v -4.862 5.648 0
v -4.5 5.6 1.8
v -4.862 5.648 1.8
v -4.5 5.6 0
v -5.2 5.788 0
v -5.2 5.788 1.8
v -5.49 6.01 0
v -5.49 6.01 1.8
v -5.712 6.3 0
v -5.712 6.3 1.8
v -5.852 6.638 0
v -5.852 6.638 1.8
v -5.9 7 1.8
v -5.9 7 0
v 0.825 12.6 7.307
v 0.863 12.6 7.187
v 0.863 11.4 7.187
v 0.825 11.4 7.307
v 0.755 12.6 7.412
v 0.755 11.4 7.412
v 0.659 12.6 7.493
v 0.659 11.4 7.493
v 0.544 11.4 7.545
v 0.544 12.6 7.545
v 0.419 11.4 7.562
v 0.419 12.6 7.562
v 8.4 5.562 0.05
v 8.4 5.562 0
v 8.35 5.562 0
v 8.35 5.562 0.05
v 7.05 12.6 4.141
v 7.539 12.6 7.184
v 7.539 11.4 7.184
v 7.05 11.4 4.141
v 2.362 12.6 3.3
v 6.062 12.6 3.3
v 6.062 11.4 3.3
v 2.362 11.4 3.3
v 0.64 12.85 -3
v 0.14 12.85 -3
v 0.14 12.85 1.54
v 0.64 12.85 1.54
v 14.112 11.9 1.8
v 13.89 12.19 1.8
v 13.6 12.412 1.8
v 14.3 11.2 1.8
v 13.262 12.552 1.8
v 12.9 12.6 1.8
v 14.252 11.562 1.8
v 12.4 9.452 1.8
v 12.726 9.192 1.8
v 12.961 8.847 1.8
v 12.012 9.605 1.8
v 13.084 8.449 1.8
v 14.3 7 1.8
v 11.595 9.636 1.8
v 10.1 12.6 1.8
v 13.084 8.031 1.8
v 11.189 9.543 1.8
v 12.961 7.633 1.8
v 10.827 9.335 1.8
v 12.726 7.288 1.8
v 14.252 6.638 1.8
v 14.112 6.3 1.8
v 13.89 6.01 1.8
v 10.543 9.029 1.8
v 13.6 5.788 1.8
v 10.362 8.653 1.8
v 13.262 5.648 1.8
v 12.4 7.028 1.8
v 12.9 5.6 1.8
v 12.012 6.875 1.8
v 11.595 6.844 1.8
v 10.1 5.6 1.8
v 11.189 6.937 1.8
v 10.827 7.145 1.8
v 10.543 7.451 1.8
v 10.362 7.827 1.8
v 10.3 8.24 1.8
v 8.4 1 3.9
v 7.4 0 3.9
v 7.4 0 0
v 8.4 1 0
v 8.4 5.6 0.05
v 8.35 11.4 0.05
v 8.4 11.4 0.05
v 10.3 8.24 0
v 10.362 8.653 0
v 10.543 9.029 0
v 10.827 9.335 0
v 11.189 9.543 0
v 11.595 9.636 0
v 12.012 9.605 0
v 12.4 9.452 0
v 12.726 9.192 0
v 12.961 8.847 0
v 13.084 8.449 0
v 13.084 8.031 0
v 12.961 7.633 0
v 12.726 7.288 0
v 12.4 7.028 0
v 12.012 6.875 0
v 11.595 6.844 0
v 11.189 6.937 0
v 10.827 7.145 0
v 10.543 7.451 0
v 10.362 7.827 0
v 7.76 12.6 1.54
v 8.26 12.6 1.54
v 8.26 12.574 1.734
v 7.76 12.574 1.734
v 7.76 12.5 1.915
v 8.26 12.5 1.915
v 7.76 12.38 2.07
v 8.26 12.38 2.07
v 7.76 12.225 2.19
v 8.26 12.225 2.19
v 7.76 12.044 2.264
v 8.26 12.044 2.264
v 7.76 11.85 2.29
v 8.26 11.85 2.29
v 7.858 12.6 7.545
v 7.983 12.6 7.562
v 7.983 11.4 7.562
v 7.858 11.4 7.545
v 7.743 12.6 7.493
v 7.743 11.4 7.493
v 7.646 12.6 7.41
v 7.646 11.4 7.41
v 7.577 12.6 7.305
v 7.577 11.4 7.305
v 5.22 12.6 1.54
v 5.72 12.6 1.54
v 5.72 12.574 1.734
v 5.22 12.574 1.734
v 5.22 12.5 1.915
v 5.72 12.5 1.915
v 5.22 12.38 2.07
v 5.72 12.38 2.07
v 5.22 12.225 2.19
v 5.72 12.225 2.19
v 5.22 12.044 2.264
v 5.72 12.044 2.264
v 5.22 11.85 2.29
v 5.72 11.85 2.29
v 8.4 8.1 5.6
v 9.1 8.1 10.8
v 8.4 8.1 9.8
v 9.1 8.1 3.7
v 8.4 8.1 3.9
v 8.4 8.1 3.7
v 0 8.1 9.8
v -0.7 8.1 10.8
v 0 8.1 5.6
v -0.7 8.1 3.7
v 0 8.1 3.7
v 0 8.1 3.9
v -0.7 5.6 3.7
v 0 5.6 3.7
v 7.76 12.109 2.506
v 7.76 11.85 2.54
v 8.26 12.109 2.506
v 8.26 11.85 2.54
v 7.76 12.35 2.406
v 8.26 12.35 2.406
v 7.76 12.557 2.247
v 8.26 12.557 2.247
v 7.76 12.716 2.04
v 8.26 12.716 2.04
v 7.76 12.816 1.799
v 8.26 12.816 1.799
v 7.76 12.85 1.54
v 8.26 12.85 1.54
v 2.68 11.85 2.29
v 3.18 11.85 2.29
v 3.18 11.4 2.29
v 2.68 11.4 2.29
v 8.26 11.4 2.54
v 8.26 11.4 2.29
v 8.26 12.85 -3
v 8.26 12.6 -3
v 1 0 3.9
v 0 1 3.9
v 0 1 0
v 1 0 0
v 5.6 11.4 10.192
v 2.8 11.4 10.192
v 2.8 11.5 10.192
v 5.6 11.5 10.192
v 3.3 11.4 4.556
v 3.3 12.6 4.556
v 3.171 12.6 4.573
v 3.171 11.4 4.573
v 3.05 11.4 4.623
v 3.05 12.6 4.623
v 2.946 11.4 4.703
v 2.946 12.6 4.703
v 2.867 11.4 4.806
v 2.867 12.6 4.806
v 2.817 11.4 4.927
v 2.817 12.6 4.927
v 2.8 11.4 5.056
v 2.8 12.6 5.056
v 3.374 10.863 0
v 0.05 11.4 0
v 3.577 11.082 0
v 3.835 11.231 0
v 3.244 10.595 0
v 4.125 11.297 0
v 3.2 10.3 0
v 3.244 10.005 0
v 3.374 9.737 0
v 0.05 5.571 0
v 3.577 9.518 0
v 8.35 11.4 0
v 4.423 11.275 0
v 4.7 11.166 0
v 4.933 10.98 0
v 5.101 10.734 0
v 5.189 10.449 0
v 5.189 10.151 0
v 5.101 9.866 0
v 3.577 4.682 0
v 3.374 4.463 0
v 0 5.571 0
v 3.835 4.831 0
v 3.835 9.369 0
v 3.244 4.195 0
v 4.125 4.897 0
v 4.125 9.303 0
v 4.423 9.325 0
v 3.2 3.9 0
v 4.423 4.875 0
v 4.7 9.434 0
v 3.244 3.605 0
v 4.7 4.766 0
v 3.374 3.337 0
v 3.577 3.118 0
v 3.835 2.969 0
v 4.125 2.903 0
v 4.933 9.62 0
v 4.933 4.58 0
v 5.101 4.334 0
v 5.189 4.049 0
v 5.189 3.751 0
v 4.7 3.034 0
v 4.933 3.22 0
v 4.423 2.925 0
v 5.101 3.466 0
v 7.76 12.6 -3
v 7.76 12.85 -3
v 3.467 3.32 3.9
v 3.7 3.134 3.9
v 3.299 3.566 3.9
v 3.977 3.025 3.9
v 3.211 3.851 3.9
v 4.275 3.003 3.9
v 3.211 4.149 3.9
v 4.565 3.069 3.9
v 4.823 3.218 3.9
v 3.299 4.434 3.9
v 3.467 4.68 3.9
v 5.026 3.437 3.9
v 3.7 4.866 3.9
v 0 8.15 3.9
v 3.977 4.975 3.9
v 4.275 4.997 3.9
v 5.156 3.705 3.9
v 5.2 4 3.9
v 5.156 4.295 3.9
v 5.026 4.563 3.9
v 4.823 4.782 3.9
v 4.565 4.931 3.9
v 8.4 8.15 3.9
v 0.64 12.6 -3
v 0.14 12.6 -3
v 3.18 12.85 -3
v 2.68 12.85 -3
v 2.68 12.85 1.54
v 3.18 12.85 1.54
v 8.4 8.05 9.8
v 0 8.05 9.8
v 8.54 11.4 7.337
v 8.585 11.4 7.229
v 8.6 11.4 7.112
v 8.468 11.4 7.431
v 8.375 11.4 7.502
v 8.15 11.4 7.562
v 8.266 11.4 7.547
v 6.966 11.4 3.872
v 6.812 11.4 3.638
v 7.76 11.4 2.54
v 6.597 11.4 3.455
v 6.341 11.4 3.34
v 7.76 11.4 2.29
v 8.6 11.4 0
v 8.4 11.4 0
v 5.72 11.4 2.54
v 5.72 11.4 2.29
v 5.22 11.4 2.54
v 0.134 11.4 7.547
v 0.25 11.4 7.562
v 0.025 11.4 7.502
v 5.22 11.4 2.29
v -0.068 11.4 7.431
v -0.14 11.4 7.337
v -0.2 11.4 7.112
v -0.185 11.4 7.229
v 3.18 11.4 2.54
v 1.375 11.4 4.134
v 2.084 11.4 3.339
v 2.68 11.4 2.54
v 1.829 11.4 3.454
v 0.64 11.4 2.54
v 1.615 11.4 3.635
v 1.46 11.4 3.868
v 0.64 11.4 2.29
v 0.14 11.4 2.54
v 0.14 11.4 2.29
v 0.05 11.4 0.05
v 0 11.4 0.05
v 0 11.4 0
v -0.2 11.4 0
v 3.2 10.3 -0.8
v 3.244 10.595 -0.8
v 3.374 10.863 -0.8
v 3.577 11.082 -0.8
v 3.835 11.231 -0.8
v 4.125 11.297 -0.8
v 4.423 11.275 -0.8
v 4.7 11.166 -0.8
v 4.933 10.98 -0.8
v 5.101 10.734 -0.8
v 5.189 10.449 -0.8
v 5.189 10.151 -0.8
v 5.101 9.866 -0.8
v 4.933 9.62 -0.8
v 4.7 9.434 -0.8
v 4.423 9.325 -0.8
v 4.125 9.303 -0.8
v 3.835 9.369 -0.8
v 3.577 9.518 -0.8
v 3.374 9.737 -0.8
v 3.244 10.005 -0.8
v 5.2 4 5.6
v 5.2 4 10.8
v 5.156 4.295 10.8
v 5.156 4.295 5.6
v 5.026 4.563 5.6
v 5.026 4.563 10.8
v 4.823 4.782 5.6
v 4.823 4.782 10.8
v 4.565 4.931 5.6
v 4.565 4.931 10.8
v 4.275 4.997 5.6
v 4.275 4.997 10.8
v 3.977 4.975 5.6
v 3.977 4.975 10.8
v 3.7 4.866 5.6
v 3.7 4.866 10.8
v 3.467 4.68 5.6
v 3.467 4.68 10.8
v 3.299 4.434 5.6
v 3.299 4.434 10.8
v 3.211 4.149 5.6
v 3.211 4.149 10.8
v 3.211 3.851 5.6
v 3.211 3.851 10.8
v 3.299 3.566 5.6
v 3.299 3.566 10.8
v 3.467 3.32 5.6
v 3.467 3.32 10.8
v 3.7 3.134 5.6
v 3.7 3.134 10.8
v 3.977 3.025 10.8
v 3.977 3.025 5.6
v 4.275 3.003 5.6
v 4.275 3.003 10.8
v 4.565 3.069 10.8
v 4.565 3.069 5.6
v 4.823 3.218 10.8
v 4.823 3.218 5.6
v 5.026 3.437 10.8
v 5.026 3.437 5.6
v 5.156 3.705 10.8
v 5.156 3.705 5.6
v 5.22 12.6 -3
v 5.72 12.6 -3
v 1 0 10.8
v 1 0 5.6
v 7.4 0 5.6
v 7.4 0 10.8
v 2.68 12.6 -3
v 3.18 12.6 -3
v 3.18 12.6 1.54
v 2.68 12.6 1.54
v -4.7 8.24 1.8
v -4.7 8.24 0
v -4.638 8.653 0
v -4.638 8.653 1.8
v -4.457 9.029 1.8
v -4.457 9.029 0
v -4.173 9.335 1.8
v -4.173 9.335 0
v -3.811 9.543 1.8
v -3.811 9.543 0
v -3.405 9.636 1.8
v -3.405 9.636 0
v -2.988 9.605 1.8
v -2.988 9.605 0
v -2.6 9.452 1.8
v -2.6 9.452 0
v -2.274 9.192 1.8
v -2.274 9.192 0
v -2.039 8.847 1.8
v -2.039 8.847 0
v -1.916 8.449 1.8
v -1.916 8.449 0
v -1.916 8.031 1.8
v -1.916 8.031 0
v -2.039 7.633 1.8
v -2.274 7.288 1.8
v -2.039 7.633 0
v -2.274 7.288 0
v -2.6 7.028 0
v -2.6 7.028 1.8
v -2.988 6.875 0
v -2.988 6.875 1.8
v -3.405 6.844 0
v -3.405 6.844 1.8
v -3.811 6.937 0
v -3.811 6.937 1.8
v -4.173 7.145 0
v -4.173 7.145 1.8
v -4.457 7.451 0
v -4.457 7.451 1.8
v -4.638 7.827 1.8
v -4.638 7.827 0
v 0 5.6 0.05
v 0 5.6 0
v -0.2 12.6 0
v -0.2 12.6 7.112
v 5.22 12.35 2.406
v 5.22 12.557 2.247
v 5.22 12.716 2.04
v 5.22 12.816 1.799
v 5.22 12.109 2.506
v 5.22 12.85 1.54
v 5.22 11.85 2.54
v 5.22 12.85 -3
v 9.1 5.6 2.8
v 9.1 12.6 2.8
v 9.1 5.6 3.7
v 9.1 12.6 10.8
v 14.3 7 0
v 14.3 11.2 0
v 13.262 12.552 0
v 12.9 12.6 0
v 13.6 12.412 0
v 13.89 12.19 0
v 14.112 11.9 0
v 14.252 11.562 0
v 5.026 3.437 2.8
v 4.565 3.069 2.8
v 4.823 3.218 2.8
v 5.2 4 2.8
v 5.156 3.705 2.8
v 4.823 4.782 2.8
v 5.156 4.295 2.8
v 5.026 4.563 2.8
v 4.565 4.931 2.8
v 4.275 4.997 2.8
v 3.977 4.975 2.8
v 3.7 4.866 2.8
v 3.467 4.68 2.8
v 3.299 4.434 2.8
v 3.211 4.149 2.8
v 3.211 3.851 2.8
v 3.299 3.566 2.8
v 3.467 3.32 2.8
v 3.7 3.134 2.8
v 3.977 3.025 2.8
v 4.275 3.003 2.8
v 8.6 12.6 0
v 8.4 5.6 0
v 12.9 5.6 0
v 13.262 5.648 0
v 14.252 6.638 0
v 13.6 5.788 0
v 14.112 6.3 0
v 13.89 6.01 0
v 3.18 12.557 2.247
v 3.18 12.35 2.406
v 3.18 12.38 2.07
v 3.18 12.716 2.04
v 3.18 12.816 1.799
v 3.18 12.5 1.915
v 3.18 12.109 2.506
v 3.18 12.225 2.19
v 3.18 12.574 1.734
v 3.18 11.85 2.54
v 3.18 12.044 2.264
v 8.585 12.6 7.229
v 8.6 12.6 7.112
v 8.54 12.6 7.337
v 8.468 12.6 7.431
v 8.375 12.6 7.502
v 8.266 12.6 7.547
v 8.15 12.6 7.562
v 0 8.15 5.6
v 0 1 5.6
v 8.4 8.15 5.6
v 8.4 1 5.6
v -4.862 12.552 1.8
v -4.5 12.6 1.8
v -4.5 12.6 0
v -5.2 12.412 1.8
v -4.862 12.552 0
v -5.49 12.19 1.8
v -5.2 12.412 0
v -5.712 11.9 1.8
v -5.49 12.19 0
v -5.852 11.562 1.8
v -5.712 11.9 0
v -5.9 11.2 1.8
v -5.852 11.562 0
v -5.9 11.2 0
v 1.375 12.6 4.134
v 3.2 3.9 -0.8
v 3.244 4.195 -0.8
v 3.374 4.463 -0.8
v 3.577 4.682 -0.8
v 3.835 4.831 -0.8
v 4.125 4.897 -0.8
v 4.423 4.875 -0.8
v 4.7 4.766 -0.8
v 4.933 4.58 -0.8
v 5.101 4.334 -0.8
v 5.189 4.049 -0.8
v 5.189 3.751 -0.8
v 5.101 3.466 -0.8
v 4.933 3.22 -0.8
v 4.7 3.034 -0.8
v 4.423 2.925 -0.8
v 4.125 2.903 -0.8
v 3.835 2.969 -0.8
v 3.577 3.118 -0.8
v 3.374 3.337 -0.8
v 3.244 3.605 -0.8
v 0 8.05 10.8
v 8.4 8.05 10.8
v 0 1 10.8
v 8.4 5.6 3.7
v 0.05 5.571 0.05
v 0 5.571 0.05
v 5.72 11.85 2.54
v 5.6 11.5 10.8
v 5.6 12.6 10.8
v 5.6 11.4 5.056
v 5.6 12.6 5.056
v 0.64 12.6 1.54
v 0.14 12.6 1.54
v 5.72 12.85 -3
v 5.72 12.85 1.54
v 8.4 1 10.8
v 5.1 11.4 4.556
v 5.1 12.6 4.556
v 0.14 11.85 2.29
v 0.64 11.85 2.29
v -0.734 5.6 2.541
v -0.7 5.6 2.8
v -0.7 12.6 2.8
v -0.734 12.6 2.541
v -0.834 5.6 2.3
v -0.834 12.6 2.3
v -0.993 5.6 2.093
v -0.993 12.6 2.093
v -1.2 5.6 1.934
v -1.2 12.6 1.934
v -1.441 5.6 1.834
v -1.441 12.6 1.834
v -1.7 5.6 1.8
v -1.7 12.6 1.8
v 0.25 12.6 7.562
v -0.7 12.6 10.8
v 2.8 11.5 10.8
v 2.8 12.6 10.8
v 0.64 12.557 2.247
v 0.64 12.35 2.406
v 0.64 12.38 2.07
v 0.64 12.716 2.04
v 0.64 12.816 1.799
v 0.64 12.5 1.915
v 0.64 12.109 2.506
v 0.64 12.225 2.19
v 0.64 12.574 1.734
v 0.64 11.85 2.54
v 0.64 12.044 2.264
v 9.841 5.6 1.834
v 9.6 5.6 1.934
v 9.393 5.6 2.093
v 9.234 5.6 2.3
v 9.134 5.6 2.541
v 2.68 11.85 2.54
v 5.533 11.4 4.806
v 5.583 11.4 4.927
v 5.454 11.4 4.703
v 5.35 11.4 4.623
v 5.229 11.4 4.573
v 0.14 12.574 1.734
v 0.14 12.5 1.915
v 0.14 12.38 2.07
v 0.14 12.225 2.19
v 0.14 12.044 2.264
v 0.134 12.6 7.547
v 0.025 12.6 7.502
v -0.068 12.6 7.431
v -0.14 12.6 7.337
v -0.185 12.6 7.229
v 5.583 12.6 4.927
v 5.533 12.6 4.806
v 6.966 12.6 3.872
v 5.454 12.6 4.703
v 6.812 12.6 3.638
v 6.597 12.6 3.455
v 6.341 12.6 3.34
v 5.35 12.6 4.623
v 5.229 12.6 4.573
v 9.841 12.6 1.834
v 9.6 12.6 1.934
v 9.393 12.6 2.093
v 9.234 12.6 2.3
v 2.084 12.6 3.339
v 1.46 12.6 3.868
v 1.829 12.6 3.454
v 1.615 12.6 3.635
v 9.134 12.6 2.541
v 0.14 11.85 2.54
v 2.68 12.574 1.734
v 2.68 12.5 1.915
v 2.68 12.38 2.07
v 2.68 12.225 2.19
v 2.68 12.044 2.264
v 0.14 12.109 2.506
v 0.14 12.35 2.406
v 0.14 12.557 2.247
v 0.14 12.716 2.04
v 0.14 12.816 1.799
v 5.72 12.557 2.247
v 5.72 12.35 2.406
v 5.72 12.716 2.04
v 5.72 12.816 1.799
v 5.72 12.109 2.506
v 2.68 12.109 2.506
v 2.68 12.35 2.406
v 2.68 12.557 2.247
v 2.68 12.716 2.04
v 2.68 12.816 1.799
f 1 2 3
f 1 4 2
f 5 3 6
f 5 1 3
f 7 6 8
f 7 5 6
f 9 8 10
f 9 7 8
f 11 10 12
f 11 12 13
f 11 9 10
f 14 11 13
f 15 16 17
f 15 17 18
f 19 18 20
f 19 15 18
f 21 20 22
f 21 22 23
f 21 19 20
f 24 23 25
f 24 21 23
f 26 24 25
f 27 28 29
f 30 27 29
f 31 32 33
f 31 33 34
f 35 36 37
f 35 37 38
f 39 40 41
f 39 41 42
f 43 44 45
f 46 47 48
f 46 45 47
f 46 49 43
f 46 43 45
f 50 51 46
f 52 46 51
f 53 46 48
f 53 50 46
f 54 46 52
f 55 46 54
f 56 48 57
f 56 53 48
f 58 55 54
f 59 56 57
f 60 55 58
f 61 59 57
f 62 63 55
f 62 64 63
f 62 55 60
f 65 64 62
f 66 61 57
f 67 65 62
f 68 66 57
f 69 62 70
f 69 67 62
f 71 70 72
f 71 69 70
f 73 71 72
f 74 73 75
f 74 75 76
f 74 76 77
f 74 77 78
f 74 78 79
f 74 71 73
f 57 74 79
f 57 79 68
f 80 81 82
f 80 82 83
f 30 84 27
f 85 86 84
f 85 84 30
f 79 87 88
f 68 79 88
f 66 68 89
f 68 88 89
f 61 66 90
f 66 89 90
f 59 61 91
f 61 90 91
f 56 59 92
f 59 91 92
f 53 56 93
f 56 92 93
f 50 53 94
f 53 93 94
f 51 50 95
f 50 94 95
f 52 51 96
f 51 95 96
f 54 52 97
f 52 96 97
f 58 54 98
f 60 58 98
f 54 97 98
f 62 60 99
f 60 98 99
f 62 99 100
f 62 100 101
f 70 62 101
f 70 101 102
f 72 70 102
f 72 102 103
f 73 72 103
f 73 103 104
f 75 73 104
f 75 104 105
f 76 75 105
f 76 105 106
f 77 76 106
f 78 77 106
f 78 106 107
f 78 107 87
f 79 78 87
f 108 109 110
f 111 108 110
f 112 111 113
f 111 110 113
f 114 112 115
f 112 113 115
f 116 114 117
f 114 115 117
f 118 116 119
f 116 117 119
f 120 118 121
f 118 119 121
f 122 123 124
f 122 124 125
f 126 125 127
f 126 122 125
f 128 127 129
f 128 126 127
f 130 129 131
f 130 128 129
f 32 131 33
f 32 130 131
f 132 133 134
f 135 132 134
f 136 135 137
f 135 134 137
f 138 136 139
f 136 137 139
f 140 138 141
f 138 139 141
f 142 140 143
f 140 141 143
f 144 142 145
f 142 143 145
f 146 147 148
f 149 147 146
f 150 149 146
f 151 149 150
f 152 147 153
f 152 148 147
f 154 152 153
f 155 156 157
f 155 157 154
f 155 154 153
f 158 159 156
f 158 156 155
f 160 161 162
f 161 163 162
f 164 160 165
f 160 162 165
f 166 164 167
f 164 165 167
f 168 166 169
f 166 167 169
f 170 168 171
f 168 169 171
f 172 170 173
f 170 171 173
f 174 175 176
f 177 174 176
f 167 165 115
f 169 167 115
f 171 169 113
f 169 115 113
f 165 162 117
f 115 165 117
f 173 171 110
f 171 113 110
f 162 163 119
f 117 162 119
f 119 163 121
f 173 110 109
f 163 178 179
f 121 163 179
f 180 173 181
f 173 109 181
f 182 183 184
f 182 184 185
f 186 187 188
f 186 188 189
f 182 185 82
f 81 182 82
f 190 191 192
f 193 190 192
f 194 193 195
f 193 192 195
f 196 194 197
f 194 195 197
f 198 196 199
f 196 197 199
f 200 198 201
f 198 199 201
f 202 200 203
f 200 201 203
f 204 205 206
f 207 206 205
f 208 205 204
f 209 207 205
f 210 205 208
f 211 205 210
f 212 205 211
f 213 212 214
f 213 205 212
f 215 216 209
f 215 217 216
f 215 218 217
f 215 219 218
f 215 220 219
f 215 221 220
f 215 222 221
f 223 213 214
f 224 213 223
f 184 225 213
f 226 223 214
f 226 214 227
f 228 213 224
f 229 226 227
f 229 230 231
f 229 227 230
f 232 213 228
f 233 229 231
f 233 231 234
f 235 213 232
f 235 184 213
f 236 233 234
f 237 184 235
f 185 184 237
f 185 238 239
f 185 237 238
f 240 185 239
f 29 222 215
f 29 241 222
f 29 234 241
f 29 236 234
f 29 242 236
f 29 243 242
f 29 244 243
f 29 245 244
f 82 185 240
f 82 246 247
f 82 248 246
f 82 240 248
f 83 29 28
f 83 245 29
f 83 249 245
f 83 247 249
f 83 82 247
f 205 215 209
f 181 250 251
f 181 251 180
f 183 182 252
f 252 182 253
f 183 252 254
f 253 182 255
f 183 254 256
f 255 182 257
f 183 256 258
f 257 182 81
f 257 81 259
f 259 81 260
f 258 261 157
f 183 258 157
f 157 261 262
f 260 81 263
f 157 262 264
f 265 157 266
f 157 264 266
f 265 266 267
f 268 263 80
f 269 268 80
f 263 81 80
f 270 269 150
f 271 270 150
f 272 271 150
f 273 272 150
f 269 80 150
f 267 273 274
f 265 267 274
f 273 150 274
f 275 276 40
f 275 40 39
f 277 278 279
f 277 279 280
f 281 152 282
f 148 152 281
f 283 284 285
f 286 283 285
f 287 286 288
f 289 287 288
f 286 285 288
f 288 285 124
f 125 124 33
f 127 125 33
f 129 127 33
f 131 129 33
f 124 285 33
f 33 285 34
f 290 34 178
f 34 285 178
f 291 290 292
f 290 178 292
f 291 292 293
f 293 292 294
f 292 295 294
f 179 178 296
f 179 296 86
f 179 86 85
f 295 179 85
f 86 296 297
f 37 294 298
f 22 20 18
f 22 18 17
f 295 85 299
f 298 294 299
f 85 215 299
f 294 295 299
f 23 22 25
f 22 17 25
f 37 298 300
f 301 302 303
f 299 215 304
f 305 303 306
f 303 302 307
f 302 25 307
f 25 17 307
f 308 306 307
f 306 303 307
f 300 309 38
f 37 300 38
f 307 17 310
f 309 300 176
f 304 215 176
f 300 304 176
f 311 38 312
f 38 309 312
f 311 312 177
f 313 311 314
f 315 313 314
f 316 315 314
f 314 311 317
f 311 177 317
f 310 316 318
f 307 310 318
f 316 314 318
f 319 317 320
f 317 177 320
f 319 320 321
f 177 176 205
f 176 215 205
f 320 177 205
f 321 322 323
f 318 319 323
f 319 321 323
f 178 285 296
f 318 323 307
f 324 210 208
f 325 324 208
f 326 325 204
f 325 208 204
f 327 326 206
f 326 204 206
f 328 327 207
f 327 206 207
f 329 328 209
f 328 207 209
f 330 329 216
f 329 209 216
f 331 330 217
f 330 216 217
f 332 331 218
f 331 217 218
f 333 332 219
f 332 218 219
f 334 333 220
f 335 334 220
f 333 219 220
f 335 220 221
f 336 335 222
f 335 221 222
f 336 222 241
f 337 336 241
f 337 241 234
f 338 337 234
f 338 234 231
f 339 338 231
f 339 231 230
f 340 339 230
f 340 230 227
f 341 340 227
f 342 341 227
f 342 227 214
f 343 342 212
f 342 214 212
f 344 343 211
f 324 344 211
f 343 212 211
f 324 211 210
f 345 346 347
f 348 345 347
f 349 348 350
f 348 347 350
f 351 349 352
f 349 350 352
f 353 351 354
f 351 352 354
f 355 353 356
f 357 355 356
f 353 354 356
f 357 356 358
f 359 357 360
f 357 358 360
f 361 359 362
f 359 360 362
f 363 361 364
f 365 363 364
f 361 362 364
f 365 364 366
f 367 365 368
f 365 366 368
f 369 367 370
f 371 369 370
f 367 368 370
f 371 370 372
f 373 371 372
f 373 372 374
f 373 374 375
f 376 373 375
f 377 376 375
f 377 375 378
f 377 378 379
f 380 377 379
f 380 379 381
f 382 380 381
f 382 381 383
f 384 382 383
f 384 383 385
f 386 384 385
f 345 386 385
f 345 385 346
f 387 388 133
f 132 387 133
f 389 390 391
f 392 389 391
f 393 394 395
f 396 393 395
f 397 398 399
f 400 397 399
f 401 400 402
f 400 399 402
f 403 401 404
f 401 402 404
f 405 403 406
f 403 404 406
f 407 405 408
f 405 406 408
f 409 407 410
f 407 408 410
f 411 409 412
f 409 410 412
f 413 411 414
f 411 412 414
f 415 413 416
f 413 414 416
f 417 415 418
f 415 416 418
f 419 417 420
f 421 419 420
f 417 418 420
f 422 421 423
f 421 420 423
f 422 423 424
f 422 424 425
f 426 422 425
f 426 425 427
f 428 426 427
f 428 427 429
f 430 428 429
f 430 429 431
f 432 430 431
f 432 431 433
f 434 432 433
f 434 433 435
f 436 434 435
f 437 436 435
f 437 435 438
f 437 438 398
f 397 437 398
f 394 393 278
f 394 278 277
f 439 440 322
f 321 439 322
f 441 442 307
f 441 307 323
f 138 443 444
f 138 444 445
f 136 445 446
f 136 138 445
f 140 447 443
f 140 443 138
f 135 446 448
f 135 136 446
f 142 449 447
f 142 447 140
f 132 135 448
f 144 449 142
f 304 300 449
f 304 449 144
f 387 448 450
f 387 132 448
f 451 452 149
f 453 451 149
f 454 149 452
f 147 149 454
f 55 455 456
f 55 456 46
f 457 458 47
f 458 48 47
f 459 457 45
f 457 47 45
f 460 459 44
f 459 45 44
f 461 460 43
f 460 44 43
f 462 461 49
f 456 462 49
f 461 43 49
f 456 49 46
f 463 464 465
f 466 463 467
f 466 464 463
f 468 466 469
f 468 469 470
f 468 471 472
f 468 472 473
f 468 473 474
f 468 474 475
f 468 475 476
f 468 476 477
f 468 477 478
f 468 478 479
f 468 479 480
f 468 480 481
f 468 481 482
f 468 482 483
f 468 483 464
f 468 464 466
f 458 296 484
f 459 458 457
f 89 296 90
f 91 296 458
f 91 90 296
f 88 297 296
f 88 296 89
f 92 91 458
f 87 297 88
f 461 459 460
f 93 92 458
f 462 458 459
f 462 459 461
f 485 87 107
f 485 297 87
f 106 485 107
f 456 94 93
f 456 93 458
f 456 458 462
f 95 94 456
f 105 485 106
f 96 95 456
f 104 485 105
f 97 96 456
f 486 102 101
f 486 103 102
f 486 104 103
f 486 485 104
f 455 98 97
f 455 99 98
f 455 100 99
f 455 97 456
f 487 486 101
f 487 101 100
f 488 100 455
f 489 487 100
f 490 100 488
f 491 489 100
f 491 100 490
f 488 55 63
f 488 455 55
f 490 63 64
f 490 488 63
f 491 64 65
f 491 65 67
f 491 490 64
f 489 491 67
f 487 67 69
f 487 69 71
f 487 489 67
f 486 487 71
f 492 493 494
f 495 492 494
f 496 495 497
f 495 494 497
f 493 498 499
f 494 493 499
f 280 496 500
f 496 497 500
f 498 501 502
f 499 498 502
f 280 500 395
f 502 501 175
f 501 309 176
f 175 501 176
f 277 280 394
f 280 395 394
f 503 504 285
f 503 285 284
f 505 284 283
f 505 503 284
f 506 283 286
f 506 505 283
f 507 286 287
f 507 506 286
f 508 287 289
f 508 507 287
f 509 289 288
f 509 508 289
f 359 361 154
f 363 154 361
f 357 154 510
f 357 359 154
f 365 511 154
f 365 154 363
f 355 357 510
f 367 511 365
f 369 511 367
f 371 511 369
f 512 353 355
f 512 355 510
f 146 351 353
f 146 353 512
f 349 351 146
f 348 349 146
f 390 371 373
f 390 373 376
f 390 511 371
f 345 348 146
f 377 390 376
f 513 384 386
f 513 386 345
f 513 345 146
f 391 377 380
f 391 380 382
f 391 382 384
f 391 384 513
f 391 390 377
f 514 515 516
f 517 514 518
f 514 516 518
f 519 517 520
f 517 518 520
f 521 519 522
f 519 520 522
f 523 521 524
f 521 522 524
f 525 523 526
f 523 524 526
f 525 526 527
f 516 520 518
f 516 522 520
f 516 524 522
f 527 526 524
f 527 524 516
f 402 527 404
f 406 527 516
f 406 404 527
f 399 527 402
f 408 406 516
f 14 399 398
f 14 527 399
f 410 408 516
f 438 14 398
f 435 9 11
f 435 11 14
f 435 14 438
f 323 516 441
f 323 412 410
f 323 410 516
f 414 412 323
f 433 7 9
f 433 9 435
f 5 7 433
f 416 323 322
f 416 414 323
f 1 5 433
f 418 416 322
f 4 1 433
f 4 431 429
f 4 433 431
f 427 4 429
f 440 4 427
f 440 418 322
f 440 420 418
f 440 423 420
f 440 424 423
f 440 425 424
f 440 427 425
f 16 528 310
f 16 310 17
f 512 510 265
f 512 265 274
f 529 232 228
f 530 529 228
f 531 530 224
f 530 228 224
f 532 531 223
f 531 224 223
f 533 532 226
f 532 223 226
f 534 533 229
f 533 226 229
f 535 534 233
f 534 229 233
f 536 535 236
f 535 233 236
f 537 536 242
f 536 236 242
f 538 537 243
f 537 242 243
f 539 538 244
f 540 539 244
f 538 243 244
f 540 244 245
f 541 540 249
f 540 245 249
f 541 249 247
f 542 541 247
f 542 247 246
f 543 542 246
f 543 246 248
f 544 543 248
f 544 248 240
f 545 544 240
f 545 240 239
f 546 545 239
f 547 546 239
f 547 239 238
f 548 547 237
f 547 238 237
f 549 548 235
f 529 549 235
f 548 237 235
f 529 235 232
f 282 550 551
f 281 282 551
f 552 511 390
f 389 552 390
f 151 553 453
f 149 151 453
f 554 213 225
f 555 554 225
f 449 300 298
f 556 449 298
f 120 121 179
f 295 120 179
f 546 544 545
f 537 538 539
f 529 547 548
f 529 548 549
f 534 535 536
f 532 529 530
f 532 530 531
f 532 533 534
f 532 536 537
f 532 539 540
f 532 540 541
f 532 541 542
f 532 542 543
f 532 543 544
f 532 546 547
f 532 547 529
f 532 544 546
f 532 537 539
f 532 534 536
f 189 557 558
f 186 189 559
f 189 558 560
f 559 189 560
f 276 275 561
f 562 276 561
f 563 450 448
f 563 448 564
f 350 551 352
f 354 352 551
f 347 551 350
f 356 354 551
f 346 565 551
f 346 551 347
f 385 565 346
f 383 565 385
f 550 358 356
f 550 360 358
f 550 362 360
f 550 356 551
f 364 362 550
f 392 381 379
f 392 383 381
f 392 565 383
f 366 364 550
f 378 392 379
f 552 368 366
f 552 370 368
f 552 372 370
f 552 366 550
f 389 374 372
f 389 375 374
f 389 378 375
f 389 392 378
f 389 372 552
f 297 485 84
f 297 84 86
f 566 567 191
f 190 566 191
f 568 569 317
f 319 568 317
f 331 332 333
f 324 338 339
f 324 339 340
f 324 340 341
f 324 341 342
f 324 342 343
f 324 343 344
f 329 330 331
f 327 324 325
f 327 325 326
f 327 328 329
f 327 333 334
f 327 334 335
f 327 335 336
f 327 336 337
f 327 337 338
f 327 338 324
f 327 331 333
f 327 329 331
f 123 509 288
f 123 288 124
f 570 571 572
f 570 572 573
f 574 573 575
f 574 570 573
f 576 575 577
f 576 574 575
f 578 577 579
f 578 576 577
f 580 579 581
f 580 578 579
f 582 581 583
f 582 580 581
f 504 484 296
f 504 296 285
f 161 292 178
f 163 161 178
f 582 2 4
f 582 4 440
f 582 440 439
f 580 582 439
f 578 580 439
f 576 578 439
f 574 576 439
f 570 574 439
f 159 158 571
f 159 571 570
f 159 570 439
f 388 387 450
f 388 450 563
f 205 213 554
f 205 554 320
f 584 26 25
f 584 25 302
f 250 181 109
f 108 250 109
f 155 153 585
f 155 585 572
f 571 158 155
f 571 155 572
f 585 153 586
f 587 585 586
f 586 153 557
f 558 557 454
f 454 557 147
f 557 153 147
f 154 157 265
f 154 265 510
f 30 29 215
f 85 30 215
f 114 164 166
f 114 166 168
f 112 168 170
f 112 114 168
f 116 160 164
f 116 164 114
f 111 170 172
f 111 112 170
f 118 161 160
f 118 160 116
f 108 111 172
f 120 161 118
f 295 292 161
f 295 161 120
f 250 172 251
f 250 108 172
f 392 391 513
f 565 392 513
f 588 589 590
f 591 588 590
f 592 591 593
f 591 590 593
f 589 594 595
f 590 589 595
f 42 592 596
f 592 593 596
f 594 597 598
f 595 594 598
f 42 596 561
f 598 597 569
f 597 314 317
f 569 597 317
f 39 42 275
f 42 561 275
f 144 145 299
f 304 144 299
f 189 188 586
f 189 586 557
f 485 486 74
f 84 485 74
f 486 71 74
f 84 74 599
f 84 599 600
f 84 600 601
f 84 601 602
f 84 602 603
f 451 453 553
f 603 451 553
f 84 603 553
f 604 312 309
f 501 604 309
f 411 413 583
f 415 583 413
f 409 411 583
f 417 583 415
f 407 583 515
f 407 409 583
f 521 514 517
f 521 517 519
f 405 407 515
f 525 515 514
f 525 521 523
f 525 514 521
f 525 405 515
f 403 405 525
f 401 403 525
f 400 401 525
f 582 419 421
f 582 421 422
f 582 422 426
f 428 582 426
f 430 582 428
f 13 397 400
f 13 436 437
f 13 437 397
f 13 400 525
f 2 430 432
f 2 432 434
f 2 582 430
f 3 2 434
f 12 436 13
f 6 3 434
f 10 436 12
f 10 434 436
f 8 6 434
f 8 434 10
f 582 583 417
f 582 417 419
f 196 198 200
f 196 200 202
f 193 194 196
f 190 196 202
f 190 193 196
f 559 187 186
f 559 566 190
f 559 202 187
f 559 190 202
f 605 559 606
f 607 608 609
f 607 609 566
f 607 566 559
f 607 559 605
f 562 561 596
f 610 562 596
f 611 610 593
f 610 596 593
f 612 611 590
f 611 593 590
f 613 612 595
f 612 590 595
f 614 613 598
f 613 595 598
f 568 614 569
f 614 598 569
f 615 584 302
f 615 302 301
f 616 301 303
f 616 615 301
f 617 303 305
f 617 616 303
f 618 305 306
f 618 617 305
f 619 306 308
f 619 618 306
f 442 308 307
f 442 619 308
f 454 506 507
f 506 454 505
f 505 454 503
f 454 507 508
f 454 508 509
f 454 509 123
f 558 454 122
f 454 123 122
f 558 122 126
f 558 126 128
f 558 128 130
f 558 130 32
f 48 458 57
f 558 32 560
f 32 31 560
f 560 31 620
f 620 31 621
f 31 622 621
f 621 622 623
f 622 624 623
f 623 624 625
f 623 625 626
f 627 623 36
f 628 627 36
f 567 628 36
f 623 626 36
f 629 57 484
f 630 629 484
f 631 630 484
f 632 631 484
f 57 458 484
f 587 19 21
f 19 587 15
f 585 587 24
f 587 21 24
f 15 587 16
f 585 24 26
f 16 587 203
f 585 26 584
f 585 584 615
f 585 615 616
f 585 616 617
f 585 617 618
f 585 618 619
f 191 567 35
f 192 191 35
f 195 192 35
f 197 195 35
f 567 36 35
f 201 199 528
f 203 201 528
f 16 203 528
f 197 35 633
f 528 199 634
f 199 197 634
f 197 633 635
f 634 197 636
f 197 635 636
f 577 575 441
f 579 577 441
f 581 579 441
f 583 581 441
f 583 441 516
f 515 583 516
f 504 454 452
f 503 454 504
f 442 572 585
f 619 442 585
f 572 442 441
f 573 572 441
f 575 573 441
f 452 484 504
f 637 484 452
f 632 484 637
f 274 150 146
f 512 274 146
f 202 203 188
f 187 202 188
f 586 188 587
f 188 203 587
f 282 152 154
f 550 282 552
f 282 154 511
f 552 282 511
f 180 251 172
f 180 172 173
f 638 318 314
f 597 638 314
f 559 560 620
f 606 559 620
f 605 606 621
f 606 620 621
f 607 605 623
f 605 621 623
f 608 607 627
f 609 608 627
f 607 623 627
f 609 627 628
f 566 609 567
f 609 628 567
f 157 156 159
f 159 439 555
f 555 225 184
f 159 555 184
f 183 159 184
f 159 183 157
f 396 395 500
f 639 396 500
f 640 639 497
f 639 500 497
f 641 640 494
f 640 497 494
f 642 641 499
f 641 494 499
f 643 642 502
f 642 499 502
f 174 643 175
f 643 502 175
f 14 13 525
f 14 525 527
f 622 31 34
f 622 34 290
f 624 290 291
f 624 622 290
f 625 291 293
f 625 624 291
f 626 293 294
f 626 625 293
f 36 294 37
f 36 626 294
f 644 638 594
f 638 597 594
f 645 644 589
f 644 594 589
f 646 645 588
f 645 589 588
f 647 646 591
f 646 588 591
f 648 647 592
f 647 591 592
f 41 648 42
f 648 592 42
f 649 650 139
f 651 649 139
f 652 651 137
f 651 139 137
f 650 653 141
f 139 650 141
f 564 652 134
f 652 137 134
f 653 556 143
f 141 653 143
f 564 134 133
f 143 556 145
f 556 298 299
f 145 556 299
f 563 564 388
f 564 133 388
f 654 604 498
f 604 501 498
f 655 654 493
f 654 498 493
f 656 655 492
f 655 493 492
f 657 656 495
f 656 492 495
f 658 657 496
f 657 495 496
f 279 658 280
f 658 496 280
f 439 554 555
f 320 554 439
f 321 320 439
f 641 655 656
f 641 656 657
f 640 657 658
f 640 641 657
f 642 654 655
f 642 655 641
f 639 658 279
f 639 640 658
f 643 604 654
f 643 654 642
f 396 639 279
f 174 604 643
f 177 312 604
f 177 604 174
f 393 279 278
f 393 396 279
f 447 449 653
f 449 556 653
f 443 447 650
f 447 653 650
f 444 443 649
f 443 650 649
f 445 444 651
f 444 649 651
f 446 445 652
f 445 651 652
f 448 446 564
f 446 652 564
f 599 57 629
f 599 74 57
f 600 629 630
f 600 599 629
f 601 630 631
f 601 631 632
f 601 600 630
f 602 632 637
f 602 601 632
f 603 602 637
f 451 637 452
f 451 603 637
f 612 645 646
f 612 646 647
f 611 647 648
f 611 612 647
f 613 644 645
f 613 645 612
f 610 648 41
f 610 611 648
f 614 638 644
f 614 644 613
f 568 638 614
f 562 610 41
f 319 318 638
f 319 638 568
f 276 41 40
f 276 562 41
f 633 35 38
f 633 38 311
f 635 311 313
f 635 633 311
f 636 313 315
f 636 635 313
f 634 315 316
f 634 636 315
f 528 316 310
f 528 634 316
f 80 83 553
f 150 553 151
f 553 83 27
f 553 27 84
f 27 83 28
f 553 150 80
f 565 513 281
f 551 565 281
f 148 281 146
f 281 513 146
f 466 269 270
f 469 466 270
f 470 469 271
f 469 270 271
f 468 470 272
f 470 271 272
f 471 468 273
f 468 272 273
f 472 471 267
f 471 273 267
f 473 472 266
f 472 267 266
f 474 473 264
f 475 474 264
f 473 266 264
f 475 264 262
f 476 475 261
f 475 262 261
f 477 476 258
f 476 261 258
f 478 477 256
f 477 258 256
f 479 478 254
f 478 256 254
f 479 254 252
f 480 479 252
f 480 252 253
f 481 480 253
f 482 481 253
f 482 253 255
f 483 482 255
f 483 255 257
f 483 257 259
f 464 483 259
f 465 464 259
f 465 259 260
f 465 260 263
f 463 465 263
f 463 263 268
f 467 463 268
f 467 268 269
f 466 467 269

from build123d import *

# Parameters (mm, degrees)
EXTRUDE_1_DEPTH      = 10.8
SKETCH_2_R           = 1
EXTRUDE_2_DEPTH      = 0.8
SKETCH_3_W           = 1.7
SKETCH_3_H           = 8.1
CUT_EXTRUDE_1_DEPTH  = 17.8
EXTRUDE_START        = -4.5
EXTRUDE_3_DEPTH      = 4.5
SKETCH_5_W           = 8.4
SKETCH_5_H           = 0.05
CUT_EXTRUDE_2_DEPTH  = 1
SKETCH_6_R           = 1
CUT_EXTRUDE_3_DEPTH  = 8
CUT_EXTRUDE_4_DEPTH  = 1.2
SKETCH_8_W           = 2.8
SKETCH_8_H           = 0.608363533
EXTRUDE_4_DEPTH      = 0.1
EXTRUDE_START_2      = 2.5
EXTRUDE_5_DEPTH      = 2.5
SKETCH_10_W          = 8.4
SKETCH_10_H          = 1.7
CUT_EXTRUDE_5_DEPTH  = 0.05
FILLET_1_R           = 1.4
SKETCH_11_W          = 0.05
SKETCH_11_H          = 5.83834946
SKETCH_11_H_2        = 5.828769054
CUT_EXTRUDE_8_DEPTH  = 0.05
SKETCH_12_R          = 1.4
CUT_EXTRUDE_9_DEPTH  = 4
SKETCH_13_W          = 0.5
SKETCH_13_H          = 5.54
EXTRUDE_6_DEPTH      = 1.45
FILLET_2_R           = 1
CUT_EXTRUDE_START    = -8.12
CUT_EXTRUDE_10_DEPTH = 8.12


with BuildPart() as part:
    # Эскиз1 → Бобышка-Вытянуть1 (new body)
    with BuildSketch(Plane.XY):
        Polygon((7.4, 0), (8.4, 1), (8.4, 12.6), (0, 12.6), (0, 1), (1, 0), align=None)
    extrude(amount=EXTRUDE_1_DEPTH)

    # Эскиз2 → Бобышка-Вытянуть2 (add)
    with BuildSketch(Plane(origin=(0, 0, 0), x_dir=(-1, 0, 0), z_dir=(0, 0, -1))):
        with Locations((-4.2, 10.3)):
            Circle(SKETCH_2_R)
        with Locations((-4.2, 3.9)):
            Circle(SKETCH_2_R)
    extrude(amount=EXTRUDE_2_DEPTH)

    # Эскиз3 → Вырез-Вытянуть1 (cut)
    with BuildSketch(Plane(origin=(8.4, 0, 0), x_dir=(0, 0, -1), z_dir=(1, 0, 0))):
        with Locations((-4.75, 4.05)):
            Rectangle(SKETCH_3_W, SKETCH_3_H)
    extrude(amount=-CUT_EXTRUDE_1_DEPTH, mode=Mode.SUBTRACT)

    # Эскиз4 → Бобышка-Вытянуть3 (add)
    with BuildSketch(Plane(origin=(0, 12.6, 0), x_dir=(1, 0, 0), z_dir=(0, 1, 0)).offset(EXTRUDE_START)):
        with BuildLine():
            Line((9.1, -10.8), (-0.7, -10.8))
            Line((-0.7, -10.8), (-0.7, -2.8))
            ThreePointArc((-0.7, -2.8), (-0.992893219, -2.092893219), (-1.7, -1.8))
            Line((-1.7, -1.8), (-5.9, -1.8))
            Line((-5.9, -1.8), (-5.9, 0))
            Line((-5.9, 0), (14.3, 0))
            Line((14.3, 0), (14.3, -1.8))
            Line((14.3, -1.8), (10.1, -1.8))
            ThreePointArc((10.1, -1.8), (9.392893219, -2.092893219), (9.1, -2.8))
            Line((9.1, -2.8), (9.1, -10.8))
        make_face()
    extrude(amount=EXTRUDE_3_DEPTH)

    # Эскиз5 → Вырез-Вытянуть2 (cut)
    with BuildSketch(Plane.XY.offset(10.8)):
        with Locations((4.2, 8.075)):
            Rectangle(SKETCH_5_W, SKETCH_5_H)
    extrude(amount=-CUT_EXTRUDE_2_DEPTH, mode=Mode.SUBTRACT)

    # Эскиз6 → Вырез-Вытянуть3 (cut)
    with BuildSketch(Plane.XY.offset(10.8)):
        with Locations((4.2, 4)):
            Circle(SKETCH_6_R)
    extrude(amount=-CUT_EXTRUDE_3_DEPTH, mode=Mode.SUBTRACT)

    # Эскиз7 → Вырез-Вытянуть4 (cut)
    with BuildSketch(Plane(origin=(0, 12.6, 0), x_dir=(1, 0, 0), z_dir=(0, 1, 0))):
        with BuildLine():
            Line((8.6, 0), (8.6, -7.112411136))
            ThreePointArc((8.6, -7.112411136), (8.468198052, -7.430609188), (8.15, -7.562411136))
            Line((8.15, -7.562411136), (7.983405928, -7.562411136))
            ThreePointArc((7.983405928, -7.562411136), (7.691564003, -7.454943311), (7.539115931, -7.183870205))
            Line((7.539115931, -7.183870205), (7.049736844, -4.141202068))
            ThreePointArc((7.049736844, -4.141202068), (6.710963351, -3.53881739), (6.062425739, -3.3))
            Line((6.062425739, -3.3), (2.361664993, -3.3))
            ThreePointArc((2.361664993, -3.3), (1.71573807, -3.536600753), (1.37546474, -4.13444318))
            Line((1.37546474, -4.13444318), (0.863036378, -7.186911705))
            ThreePointArc((0.863036378, -7.186911705), (0.709913379, -7.455940797), (0.419246264, -7.562411136))
            Line((0.419246264, -7.562411136), (0.25, -7.562411136))
            ThreePointArc((0.25, -7.562411136), (-0.068198052, -7.430609188), (-0.2, -7.112411136))
            Line((-0.2, -7.112411136), (-0.2, 0))
            Line((-0.2, 0), (8.6, 0))
        make_face()
        with BuildLine():
            Line((4.2, -10.8), (5.6, -10.8))
            Line((5.6, -10.8), (5.6, -5.056380156))
            ThreePointArc((5.6, -5.056380156), (5.453553391, -4.702826765), (5.1, -4.556380156))
            Line((5.1, -4.556380156), (3.3, -4.556380156))
            ThreePointArc((3.3, -4.556380156), (2.946446609, -4.702826765), (2.8, -5.056380156))
            Line((2.8, -5.056380156), (2.8, -10.8))
            Line((2.8, -10.8), (4.2, -10.8))
        make_face()
    extrude(amount=-CUT_EXTRUDE_4_DEPTH, mode=Mode.SUBTRACT)

    # Эскиз8 → Бобышка-Вытянуть4 (add)
    with BuildSketch(Plane(origin=(0, 11.4, 0), x_dir=(1, 0, 0), z_dir=(0, 1, 0))):
        with Locations((4.2, -10.495818233)):
            Rectangle(SKETCH_8_W, SKETCH_8_H)
    extrude(amount=EXTRUDE_4_DEPTH)

    # Эскиз9 → Бобышка-Вытянуть5 (add)
    with BuildSketch(Plane.XZ.offset(-8.1).offset(EXTRUDE_START_2)):
        with BuildLine():
            Line((0, 0), (0, 3.7))
            Line((0, 3.7), (-0.7, 3.7))
            Line((-0.7, 3.7), (-0.7, 2.8))
            ThreePointArc((-0.7, 2.8), (-0.992893219, 2.092893219), (-1.7, 1.8))
            Line((-1.7, 1.8), (-5.9, 1.8))
            Line((-5.9, 1.8), (-5.9, 0))
            Line((-5.9, 0), (0, 0))
        make_face()
        with BuildLine():
            Line((14.3, 0), (8.4, 0))
            Line((8.4, 0), (8.4, 3.7))
            Line((8.4, 3.7), (9.1, 3.7))
            Line((9.1, 3.7), (9.1, 2.8))
            ThreePointArc((9.1, 2.8), (9.392893219, 2.092893219), (10.1, 1.8))
            Line((10.1, 1.8), (14.3, 1.8))
            Line((14.3, 1.8), (14.3, 0))
        make_face()
    extrude(amount=-EXTRUDE_5_DEPTH)

    # Эскиз10 → Вырез-Вытянуть5 (cut)
    with BuildSketch(Plane.XZ.offset(-8.1)):
        with Locations((4.2, 4.75)):
            Rectangle(SKETCH_10_W, SKETCH_10_H)
    extrude(amount=-CUT_EXTRUDE_5_DEPTH, mode=Mode.SUBTRACT)

    # Скругление1
    fillet_1_edges = [part.edges().sort_by_distance(p)[0] for p in [
        (-5.9, 5.6, 0.9),
        (14.3, 5.6, 0.9),
        (14.3, 12.6, 0.9),
        (-5.9, 12.6, 0.9),
    ]]
    fillet(fillet_1_edges, radius=FILLET_1_R)

    # Эскиз11 → Вырез-Вытянуть8 (cut)
    with BuildSketch(Plane(origin=(0, 0, 0), x_dir=(-1, 0, 0), z_dir=(0, 0, -1))):
        with Locations((-8.375, 8.48082527)):
            Rectangle(SKETCH_11_W, SKETCH_11_H)
        with Locations((-0.025, 8.485615473)):
            Rectangle(SKETCH_11_W, SKETCH_11_H_2)
    extrude(amount=-CUT_EXTRUDE_8_DEPTH, mode=Mode.SUBTRACT)

    # Эскиз12 → Вырез-Вытянуть9 (cut)
    with BuildSketch(Plane(origin=(0, 0, 0), x_dir=(-1, 0, 0), z_dir=(0, 0, -1))):
        with Locations((-11.7, 8.24)):
            Circle(SKETCH_12_R)
        with Locations((3.3, 8.24)):
            Circle(SKETCH_12_R)
    extrude(amount=-CUT_EXTRUDE_9_DEPTH, mode=Mode.SUBTRACT)

    # Эскиз13 → Бобышка-Вытянуть6 (add)
    with BuildSketch(Plane(origin=(0, 11.4, 0), x_dir=(1, 0, 0), z_dir=(0, 1, 0))):
        with Locations((5.47, 0.23)):
            Rectangle(SKETCH_13_W, SKETCH_13_H)
        with Locations((8.01, 0.23)):
            Rectangle(SKETCH_13_W, SKETCH_13_H)
        with Locations((2.93, 0.23)):
            Rectangle(SKETCH_13_W, SKETCH_13_H)
        with Locations((0.39, 0.23)):
            Rectangle(SKETCH_13_W, SKETCH_13_H)
    extrude(amount=EXTRUDE_6_DEPTH)

    # Скругление2
    fillet_2_edges = [part.edges().sort_by_distance(p)[0] for p in [
        (5.47, 12.85, 2.54),
        (2.93, 12.85, 2.54),
        (0.39, 12.85, 2.54),
        (8.01, 12.85, 2.54),
    ]]
    fillet(fillet_2_edges, radius=FILLET_2_R)

    # Эскиз14 → Вырез-Вытянуть10 (cut)
    with BuildSketch(Plane.ZY.offset(-0.14).offset(CUT_EXTRUDE_START)):
        with BuildLine():
            Line((-3, 12.6), (1.54, 12.6))
            ThreePointArc((1.54, 12.6), (2.070330086, 12.380330086), (2.29, 11.85))
            Line((2.29, 11.85), (2.29, 11.4))
            Line((2.29, 11.4), (-3, 11.4))
            Line((-3, 11.4), (-3, 12.6))
        make_face()
    extrude(amount=CUT_EXTRUDE_10_DEPTH, mode=Mode.SUBTRACT)


solid = part.part
